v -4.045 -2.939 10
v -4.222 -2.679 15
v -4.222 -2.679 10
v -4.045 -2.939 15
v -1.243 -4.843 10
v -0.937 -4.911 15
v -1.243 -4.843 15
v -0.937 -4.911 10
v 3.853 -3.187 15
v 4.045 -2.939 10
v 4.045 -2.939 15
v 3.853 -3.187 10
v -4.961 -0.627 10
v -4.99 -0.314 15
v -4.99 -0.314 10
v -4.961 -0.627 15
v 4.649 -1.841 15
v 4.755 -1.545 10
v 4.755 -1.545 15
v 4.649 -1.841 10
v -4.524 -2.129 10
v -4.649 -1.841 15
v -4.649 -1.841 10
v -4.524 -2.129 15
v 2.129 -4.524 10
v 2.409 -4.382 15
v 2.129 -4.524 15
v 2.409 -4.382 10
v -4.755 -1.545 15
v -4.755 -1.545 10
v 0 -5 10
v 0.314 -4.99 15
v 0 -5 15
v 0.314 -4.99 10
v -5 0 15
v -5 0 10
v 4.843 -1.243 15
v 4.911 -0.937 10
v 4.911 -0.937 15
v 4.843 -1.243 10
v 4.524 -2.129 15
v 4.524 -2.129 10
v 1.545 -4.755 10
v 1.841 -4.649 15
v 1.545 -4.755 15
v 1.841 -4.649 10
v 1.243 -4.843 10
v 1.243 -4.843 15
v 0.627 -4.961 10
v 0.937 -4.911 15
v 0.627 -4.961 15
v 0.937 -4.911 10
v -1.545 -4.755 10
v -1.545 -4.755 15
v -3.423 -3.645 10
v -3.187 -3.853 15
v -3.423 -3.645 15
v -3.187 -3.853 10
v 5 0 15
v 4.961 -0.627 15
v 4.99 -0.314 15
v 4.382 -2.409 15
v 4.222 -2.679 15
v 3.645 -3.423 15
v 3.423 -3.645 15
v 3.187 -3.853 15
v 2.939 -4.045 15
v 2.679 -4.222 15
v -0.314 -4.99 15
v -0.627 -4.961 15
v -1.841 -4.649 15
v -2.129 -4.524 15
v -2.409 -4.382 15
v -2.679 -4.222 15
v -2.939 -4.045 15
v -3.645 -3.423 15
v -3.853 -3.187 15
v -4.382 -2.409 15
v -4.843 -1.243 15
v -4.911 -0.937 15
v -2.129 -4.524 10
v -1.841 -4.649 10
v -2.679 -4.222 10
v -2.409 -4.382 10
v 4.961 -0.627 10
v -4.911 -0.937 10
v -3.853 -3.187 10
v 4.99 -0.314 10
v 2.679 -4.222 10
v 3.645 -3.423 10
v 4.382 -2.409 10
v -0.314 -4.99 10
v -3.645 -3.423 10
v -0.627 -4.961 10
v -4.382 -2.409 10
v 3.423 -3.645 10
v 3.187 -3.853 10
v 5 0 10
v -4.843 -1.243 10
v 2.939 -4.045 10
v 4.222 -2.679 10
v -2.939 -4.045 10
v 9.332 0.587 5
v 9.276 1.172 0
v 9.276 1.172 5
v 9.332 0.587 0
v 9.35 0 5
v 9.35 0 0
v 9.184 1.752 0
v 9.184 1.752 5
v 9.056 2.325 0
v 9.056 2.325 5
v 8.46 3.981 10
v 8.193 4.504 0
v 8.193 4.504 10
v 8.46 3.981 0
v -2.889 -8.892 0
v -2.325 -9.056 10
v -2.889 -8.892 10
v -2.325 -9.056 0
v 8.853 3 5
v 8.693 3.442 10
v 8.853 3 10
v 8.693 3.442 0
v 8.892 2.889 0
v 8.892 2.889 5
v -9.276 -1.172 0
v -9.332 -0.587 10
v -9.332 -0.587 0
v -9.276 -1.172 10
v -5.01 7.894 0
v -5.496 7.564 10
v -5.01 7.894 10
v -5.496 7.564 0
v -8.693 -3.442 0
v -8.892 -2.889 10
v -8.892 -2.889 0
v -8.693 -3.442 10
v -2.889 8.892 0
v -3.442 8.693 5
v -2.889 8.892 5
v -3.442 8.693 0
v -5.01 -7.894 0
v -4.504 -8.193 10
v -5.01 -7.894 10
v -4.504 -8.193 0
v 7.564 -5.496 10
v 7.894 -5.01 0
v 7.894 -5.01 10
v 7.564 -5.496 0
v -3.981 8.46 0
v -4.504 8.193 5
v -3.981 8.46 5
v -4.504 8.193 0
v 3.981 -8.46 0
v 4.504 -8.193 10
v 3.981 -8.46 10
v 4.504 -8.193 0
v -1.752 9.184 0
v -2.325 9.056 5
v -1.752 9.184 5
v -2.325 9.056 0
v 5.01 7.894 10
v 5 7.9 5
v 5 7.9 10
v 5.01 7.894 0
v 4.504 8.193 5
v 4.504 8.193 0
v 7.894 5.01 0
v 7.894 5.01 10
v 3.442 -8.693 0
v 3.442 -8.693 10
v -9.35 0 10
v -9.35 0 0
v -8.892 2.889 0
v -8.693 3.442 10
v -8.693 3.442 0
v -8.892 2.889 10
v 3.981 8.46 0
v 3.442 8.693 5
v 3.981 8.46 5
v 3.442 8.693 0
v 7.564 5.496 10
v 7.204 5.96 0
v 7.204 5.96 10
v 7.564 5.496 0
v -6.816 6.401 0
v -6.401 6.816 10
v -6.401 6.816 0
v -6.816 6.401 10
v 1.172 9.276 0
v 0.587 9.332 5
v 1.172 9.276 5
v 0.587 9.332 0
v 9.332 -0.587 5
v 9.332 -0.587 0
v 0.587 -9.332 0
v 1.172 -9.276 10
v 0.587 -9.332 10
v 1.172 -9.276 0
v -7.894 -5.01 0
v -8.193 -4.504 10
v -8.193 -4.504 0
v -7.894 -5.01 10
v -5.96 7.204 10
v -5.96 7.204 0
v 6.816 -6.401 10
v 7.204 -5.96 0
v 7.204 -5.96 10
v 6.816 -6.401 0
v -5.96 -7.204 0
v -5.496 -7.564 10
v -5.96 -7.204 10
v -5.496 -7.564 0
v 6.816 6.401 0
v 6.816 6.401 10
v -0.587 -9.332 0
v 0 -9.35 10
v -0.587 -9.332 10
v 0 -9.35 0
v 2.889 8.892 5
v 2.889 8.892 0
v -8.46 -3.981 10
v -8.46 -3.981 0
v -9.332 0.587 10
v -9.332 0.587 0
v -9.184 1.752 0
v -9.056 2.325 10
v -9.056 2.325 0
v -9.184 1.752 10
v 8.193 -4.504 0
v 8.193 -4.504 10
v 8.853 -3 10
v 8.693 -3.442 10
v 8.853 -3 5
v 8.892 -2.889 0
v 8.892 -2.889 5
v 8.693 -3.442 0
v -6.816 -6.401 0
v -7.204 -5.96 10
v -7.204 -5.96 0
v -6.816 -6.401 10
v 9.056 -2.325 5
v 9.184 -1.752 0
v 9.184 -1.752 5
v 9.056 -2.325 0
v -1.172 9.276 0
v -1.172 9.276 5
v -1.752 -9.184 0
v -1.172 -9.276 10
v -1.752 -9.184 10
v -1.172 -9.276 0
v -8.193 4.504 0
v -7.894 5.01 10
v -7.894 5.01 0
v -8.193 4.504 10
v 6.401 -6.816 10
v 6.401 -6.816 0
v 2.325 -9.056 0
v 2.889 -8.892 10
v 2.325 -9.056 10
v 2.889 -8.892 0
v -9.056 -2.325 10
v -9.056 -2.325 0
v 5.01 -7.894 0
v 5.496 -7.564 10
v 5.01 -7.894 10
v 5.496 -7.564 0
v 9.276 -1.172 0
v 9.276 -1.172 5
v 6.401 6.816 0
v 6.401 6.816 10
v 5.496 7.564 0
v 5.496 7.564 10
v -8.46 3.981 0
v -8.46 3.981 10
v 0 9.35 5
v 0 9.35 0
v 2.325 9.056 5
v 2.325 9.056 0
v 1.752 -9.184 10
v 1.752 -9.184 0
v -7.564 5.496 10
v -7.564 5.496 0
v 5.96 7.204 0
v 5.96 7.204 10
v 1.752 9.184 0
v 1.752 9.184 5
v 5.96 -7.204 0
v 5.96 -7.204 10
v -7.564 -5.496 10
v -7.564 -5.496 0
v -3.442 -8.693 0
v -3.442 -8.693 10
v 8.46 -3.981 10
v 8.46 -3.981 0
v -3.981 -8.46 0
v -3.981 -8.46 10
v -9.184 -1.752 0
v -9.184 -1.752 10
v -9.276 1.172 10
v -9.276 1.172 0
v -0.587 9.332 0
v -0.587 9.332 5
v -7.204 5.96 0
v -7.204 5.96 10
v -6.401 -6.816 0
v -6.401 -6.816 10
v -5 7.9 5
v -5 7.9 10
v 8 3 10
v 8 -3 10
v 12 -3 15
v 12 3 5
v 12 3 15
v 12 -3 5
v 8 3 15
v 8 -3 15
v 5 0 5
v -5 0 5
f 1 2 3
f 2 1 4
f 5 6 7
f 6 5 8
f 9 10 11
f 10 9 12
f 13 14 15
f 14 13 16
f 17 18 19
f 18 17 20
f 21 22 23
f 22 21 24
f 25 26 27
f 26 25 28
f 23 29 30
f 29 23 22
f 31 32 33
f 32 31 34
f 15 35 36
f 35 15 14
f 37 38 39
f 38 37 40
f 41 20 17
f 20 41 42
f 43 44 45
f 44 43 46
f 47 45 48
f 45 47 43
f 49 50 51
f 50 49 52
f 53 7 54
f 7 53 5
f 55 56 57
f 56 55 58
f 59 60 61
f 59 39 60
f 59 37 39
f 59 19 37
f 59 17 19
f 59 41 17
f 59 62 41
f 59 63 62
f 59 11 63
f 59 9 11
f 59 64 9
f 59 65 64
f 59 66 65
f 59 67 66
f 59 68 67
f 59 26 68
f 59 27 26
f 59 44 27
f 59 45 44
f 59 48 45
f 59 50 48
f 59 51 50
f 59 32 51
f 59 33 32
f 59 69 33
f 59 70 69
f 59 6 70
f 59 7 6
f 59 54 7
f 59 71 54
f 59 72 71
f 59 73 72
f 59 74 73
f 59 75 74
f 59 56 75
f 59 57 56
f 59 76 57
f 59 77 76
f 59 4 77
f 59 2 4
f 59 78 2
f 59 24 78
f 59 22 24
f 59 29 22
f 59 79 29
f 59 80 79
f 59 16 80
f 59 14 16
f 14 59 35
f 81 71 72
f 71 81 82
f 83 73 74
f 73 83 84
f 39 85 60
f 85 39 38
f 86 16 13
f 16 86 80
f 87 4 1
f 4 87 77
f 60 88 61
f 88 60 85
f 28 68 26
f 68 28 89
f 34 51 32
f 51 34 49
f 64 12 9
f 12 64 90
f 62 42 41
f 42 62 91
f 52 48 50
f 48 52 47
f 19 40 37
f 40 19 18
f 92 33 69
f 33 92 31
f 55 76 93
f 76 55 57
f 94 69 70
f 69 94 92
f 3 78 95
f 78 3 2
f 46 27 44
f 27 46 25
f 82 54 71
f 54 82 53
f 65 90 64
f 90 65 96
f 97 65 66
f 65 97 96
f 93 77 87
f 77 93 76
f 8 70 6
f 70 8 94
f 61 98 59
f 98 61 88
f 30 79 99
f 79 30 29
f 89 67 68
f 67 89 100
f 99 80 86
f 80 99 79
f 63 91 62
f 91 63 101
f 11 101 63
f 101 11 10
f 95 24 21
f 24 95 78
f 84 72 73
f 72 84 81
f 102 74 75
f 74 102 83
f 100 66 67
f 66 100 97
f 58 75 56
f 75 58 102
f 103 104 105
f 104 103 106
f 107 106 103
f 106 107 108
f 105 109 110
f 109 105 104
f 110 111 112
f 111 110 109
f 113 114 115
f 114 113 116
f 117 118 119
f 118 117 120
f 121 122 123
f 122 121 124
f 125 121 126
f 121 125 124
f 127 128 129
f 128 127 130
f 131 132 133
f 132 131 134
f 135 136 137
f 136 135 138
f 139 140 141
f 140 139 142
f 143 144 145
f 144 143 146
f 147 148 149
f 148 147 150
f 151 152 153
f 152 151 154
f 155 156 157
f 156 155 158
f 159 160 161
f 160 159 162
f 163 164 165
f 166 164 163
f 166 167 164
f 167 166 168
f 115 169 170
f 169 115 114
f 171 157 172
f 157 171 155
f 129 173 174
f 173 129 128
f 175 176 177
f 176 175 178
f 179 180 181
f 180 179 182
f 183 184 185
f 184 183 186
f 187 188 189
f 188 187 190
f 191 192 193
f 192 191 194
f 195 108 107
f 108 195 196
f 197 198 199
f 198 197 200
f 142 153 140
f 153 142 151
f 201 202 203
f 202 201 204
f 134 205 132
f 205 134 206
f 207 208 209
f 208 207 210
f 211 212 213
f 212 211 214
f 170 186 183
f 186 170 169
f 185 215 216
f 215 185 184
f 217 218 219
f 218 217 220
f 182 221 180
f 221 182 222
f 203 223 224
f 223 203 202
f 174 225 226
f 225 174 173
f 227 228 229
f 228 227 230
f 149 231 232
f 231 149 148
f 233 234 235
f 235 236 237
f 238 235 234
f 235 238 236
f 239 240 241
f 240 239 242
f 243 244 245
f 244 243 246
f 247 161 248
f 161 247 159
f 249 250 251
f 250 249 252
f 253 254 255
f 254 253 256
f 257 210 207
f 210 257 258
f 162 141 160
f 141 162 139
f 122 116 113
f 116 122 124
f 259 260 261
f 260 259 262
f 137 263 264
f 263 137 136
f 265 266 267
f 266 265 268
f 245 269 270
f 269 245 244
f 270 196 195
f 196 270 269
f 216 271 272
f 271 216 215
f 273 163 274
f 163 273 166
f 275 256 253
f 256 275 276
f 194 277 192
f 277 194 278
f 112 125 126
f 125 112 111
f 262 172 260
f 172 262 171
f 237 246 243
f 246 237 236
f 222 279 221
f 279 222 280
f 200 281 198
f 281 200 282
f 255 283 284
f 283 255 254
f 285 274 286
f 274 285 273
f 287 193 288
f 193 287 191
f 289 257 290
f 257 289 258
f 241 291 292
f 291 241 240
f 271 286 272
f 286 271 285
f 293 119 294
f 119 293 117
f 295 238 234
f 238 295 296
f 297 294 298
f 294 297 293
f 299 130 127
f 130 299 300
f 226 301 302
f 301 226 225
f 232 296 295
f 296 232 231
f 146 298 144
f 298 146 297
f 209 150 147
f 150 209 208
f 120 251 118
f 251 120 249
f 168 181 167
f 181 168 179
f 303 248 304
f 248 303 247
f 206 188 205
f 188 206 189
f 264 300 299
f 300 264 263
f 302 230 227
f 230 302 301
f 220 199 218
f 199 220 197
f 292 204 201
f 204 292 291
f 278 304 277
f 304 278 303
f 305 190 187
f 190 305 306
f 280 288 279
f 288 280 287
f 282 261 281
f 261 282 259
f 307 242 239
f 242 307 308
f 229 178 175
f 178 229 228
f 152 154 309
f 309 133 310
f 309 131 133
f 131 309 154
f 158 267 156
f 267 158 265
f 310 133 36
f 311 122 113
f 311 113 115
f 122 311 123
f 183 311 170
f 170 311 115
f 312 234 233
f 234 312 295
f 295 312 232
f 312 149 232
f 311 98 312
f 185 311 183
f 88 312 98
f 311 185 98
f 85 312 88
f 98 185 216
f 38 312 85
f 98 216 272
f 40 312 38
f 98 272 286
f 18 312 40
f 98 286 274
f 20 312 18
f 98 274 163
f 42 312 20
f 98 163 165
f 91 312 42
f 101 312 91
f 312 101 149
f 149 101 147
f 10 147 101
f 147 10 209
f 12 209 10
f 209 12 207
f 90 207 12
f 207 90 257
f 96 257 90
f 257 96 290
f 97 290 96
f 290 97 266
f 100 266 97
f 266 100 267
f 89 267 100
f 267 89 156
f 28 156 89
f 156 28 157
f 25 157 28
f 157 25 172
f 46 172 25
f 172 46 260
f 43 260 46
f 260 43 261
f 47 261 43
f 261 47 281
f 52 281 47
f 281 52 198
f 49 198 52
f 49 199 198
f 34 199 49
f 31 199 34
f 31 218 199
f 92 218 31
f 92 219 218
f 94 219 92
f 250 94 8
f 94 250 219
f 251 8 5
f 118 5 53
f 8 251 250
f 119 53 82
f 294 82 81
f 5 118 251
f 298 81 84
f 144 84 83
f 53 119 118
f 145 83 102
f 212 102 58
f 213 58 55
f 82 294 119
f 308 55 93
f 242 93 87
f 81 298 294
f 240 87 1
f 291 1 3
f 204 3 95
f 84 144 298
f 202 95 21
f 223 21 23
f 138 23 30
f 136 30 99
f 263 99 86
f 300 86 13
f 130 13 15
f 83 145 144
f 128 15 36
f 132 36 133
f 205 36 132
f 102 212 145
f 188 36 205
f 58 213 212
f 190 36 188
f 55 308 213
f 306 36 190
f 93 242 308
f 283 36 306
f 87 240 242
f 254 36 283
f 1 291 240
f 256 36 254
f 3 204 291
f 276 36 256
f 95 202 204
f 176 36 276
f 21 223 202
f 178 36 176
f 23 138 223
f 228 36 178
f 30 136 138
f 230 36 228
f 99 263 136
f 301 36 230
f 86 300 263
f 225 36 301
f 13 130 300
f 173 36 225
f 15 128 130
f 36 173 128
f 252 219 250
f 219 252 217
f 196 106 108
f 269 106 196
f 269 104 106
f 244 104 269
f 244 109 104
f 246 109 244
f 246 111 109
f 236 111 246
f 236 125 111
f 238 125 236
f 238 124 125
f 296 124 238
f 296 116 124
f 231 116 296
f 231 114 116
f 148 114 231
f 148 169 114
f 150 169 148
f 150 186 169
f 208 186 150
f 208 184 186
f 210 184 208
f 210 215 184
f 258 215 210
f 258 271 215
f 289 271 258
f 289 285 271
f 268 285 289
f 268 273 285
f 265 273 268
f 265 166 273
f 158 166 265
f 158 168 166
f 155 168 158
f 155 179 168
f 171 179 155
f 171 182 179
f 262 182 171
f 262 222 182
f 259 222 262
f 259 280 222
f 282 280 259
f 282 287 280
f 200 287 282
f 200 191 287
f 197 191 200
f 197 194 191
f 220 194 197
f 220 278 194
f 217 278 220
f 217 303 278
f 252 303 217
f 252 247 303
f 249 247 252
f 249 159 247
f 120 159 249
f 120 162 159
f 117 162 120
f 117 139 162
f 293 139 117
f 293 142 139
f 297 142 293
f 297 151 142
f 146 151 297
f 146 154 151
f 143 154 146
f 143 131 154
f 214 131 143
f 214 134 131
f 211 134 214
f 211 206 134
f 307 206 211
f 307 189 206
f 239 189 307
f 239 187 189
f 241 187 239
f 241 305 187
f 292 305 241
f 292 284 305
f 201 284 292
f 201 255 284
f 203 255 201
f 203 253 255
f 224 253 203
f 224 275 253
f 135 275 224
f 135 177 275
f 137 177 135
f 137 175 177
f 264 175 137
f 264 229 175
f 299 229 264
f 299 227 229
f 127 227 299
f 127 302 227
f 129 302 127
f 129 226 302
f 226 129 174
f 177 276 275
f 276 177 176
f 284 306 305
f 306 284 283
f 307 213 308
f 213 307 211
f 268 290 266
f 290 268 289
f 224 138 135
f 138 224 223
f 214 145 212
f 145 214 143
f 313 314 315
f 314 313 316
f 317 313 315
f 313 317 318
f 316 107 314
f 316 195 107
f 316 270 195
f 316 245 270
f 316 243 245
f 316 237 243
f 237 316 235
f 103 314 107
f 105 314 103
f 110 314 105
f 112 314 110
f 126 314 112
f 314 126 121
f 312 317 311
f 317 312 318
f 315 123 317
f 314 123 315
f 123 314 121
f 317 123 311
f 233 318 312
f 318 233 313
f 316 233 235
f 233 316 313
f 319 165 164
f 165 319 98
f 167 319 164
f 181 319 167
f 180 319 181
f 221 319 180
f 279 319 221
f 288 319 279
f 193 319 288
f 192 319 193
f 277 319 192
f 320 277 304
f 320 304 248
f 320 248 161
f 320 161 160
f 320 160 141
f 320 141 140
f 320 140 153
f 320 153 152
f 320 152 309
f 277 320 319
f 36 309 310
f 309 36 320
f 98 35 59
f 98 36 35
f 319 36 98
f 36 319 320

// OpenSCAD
// Snap-on Clip for Lab Stand and Tubing
// Orientation: Flat on XY plane, building up in +Z.
// Units: Millimetres.

// --- Dimensions ---
// Rod Stand Dimensions
$rod_diameter = 12.7;      // Inner diameter of rod ring
$rod_wall = 3;             // Wall thickness of rod ring
$rod_outer = $rod_diameter + 2 * $rod_wall; // 18.7 mm
$rod_opening_width = 10;   // Width of the cutout on the -X side
$rod_opening_y_limit = 5;  // Half-height of the cutout on the -X side

// Tubing Dimensions
$tube_diameter = 6;        // Inner diameter of tubing ring
$tube_wall = 2;            // Wall thickness of tubing ring
$tube_outer = $tube_diameter + 2 * $tube_wall; // 10 mm
$tube_center_x = 15;       // X position of tubing ring center
$tube_opening_width = 4.5; // Width of the cutout on the +X side
$tube_opening_y_limit = 2.25; // Half-height of the cutout on the +X side

// Bridge Dimensions
$bridge_width_x = 4;       // Width of bridge in X (from 8 to 12)
$bridge_height_y = 6;      // Height of bridge in Y
$bridge_z = 10;            // Height of extrusion

// --- Configuration ---
$fn = 100;                 // Smoothness for curved shapes

// --- Main Body ---
// We define the 2D profile in the XY plane and extrude it to Z.
// The profile is constructed using difference() to cut holes and openings.

difference() {
    // 1. Create the solid base shape (Union of Ring 1, Ring 2, and Bridge)
    union() {
        // --- Rod Ring (Left) ---
        // Outer circle centered at origin
        cylinder(
            h = $bridge_z,
            d = $rod_outer,
            center = [0, 0, $bridge_z/2]
        );
        
        // Cut inner hole for the rod
        cylinder(
            h = $bridge_z,
            d = $rod_diameter,
            center = [0, 0, $bridge_z/2]
        );
        
        // --- Tubing Ring (Right) ---
        // Outer circle centered at x = $tube_center_x
        translate([0, 0, $bridge_z/2]) {
            cylinder(
                h = $bridge_z,
                d = $tube_outer,
                center = [$tube_center_x, 0, $bridge_z/2]
            );
            
            // Cut inner hole for the tubing
            cylinder(
                h = $bridge_z,
                d = $tube_diameter,
                center = [$tube_center_x, 0, $bridge_z/2]
            );
        }
        
        // --- Solid Bridge ---
        // Joins the two rings. 
        // Spans from x = 8 to x = 12.
        // Height in Y is 6 mm, centered at y=0.
        translate([8, -($bridge_height_y/2), $bridge_z/2]) {
            cube([
                $bridge_width_x, 
                $bridge_height_y, 
                $bridge_z
            ]);
        }
    }
    
    // --- Cutouts for Openings ---
    // We explicitly cut the openings here.
    // We use a height slightly larger than $bridge_z to ensure clean cuts.
    $cut_height = $bridge_z + 0.1;
    
    // 1. Rod Ring Opening (-X side)
    // Remove everything with x < 0 and -5 < y < 5
    // The opening is centered at x=0, extending to the left.
    translate([-($rod_opening_width/2), 0, $bridge_z/2]) {
        cube([
            $rod_opening_width, 
            $rod_opening_y_limit * 2, 
            $cut_height
        ]);
    }
    
    // 2. Tubing Ring Opening (+X side)
    // Remove everything with x > 15 and -2.25 < y < 2.25
    // The opening is centered at x=15, extending to the right.
    translate([$tube_center_x + ($tube_opening_width/2), 0, $bridge_z/2]) {
        cube([
            $tube_opening_width, 
            $tube_opening_y_limit * 2, 
            $cut_height
        ]);
    }
}
